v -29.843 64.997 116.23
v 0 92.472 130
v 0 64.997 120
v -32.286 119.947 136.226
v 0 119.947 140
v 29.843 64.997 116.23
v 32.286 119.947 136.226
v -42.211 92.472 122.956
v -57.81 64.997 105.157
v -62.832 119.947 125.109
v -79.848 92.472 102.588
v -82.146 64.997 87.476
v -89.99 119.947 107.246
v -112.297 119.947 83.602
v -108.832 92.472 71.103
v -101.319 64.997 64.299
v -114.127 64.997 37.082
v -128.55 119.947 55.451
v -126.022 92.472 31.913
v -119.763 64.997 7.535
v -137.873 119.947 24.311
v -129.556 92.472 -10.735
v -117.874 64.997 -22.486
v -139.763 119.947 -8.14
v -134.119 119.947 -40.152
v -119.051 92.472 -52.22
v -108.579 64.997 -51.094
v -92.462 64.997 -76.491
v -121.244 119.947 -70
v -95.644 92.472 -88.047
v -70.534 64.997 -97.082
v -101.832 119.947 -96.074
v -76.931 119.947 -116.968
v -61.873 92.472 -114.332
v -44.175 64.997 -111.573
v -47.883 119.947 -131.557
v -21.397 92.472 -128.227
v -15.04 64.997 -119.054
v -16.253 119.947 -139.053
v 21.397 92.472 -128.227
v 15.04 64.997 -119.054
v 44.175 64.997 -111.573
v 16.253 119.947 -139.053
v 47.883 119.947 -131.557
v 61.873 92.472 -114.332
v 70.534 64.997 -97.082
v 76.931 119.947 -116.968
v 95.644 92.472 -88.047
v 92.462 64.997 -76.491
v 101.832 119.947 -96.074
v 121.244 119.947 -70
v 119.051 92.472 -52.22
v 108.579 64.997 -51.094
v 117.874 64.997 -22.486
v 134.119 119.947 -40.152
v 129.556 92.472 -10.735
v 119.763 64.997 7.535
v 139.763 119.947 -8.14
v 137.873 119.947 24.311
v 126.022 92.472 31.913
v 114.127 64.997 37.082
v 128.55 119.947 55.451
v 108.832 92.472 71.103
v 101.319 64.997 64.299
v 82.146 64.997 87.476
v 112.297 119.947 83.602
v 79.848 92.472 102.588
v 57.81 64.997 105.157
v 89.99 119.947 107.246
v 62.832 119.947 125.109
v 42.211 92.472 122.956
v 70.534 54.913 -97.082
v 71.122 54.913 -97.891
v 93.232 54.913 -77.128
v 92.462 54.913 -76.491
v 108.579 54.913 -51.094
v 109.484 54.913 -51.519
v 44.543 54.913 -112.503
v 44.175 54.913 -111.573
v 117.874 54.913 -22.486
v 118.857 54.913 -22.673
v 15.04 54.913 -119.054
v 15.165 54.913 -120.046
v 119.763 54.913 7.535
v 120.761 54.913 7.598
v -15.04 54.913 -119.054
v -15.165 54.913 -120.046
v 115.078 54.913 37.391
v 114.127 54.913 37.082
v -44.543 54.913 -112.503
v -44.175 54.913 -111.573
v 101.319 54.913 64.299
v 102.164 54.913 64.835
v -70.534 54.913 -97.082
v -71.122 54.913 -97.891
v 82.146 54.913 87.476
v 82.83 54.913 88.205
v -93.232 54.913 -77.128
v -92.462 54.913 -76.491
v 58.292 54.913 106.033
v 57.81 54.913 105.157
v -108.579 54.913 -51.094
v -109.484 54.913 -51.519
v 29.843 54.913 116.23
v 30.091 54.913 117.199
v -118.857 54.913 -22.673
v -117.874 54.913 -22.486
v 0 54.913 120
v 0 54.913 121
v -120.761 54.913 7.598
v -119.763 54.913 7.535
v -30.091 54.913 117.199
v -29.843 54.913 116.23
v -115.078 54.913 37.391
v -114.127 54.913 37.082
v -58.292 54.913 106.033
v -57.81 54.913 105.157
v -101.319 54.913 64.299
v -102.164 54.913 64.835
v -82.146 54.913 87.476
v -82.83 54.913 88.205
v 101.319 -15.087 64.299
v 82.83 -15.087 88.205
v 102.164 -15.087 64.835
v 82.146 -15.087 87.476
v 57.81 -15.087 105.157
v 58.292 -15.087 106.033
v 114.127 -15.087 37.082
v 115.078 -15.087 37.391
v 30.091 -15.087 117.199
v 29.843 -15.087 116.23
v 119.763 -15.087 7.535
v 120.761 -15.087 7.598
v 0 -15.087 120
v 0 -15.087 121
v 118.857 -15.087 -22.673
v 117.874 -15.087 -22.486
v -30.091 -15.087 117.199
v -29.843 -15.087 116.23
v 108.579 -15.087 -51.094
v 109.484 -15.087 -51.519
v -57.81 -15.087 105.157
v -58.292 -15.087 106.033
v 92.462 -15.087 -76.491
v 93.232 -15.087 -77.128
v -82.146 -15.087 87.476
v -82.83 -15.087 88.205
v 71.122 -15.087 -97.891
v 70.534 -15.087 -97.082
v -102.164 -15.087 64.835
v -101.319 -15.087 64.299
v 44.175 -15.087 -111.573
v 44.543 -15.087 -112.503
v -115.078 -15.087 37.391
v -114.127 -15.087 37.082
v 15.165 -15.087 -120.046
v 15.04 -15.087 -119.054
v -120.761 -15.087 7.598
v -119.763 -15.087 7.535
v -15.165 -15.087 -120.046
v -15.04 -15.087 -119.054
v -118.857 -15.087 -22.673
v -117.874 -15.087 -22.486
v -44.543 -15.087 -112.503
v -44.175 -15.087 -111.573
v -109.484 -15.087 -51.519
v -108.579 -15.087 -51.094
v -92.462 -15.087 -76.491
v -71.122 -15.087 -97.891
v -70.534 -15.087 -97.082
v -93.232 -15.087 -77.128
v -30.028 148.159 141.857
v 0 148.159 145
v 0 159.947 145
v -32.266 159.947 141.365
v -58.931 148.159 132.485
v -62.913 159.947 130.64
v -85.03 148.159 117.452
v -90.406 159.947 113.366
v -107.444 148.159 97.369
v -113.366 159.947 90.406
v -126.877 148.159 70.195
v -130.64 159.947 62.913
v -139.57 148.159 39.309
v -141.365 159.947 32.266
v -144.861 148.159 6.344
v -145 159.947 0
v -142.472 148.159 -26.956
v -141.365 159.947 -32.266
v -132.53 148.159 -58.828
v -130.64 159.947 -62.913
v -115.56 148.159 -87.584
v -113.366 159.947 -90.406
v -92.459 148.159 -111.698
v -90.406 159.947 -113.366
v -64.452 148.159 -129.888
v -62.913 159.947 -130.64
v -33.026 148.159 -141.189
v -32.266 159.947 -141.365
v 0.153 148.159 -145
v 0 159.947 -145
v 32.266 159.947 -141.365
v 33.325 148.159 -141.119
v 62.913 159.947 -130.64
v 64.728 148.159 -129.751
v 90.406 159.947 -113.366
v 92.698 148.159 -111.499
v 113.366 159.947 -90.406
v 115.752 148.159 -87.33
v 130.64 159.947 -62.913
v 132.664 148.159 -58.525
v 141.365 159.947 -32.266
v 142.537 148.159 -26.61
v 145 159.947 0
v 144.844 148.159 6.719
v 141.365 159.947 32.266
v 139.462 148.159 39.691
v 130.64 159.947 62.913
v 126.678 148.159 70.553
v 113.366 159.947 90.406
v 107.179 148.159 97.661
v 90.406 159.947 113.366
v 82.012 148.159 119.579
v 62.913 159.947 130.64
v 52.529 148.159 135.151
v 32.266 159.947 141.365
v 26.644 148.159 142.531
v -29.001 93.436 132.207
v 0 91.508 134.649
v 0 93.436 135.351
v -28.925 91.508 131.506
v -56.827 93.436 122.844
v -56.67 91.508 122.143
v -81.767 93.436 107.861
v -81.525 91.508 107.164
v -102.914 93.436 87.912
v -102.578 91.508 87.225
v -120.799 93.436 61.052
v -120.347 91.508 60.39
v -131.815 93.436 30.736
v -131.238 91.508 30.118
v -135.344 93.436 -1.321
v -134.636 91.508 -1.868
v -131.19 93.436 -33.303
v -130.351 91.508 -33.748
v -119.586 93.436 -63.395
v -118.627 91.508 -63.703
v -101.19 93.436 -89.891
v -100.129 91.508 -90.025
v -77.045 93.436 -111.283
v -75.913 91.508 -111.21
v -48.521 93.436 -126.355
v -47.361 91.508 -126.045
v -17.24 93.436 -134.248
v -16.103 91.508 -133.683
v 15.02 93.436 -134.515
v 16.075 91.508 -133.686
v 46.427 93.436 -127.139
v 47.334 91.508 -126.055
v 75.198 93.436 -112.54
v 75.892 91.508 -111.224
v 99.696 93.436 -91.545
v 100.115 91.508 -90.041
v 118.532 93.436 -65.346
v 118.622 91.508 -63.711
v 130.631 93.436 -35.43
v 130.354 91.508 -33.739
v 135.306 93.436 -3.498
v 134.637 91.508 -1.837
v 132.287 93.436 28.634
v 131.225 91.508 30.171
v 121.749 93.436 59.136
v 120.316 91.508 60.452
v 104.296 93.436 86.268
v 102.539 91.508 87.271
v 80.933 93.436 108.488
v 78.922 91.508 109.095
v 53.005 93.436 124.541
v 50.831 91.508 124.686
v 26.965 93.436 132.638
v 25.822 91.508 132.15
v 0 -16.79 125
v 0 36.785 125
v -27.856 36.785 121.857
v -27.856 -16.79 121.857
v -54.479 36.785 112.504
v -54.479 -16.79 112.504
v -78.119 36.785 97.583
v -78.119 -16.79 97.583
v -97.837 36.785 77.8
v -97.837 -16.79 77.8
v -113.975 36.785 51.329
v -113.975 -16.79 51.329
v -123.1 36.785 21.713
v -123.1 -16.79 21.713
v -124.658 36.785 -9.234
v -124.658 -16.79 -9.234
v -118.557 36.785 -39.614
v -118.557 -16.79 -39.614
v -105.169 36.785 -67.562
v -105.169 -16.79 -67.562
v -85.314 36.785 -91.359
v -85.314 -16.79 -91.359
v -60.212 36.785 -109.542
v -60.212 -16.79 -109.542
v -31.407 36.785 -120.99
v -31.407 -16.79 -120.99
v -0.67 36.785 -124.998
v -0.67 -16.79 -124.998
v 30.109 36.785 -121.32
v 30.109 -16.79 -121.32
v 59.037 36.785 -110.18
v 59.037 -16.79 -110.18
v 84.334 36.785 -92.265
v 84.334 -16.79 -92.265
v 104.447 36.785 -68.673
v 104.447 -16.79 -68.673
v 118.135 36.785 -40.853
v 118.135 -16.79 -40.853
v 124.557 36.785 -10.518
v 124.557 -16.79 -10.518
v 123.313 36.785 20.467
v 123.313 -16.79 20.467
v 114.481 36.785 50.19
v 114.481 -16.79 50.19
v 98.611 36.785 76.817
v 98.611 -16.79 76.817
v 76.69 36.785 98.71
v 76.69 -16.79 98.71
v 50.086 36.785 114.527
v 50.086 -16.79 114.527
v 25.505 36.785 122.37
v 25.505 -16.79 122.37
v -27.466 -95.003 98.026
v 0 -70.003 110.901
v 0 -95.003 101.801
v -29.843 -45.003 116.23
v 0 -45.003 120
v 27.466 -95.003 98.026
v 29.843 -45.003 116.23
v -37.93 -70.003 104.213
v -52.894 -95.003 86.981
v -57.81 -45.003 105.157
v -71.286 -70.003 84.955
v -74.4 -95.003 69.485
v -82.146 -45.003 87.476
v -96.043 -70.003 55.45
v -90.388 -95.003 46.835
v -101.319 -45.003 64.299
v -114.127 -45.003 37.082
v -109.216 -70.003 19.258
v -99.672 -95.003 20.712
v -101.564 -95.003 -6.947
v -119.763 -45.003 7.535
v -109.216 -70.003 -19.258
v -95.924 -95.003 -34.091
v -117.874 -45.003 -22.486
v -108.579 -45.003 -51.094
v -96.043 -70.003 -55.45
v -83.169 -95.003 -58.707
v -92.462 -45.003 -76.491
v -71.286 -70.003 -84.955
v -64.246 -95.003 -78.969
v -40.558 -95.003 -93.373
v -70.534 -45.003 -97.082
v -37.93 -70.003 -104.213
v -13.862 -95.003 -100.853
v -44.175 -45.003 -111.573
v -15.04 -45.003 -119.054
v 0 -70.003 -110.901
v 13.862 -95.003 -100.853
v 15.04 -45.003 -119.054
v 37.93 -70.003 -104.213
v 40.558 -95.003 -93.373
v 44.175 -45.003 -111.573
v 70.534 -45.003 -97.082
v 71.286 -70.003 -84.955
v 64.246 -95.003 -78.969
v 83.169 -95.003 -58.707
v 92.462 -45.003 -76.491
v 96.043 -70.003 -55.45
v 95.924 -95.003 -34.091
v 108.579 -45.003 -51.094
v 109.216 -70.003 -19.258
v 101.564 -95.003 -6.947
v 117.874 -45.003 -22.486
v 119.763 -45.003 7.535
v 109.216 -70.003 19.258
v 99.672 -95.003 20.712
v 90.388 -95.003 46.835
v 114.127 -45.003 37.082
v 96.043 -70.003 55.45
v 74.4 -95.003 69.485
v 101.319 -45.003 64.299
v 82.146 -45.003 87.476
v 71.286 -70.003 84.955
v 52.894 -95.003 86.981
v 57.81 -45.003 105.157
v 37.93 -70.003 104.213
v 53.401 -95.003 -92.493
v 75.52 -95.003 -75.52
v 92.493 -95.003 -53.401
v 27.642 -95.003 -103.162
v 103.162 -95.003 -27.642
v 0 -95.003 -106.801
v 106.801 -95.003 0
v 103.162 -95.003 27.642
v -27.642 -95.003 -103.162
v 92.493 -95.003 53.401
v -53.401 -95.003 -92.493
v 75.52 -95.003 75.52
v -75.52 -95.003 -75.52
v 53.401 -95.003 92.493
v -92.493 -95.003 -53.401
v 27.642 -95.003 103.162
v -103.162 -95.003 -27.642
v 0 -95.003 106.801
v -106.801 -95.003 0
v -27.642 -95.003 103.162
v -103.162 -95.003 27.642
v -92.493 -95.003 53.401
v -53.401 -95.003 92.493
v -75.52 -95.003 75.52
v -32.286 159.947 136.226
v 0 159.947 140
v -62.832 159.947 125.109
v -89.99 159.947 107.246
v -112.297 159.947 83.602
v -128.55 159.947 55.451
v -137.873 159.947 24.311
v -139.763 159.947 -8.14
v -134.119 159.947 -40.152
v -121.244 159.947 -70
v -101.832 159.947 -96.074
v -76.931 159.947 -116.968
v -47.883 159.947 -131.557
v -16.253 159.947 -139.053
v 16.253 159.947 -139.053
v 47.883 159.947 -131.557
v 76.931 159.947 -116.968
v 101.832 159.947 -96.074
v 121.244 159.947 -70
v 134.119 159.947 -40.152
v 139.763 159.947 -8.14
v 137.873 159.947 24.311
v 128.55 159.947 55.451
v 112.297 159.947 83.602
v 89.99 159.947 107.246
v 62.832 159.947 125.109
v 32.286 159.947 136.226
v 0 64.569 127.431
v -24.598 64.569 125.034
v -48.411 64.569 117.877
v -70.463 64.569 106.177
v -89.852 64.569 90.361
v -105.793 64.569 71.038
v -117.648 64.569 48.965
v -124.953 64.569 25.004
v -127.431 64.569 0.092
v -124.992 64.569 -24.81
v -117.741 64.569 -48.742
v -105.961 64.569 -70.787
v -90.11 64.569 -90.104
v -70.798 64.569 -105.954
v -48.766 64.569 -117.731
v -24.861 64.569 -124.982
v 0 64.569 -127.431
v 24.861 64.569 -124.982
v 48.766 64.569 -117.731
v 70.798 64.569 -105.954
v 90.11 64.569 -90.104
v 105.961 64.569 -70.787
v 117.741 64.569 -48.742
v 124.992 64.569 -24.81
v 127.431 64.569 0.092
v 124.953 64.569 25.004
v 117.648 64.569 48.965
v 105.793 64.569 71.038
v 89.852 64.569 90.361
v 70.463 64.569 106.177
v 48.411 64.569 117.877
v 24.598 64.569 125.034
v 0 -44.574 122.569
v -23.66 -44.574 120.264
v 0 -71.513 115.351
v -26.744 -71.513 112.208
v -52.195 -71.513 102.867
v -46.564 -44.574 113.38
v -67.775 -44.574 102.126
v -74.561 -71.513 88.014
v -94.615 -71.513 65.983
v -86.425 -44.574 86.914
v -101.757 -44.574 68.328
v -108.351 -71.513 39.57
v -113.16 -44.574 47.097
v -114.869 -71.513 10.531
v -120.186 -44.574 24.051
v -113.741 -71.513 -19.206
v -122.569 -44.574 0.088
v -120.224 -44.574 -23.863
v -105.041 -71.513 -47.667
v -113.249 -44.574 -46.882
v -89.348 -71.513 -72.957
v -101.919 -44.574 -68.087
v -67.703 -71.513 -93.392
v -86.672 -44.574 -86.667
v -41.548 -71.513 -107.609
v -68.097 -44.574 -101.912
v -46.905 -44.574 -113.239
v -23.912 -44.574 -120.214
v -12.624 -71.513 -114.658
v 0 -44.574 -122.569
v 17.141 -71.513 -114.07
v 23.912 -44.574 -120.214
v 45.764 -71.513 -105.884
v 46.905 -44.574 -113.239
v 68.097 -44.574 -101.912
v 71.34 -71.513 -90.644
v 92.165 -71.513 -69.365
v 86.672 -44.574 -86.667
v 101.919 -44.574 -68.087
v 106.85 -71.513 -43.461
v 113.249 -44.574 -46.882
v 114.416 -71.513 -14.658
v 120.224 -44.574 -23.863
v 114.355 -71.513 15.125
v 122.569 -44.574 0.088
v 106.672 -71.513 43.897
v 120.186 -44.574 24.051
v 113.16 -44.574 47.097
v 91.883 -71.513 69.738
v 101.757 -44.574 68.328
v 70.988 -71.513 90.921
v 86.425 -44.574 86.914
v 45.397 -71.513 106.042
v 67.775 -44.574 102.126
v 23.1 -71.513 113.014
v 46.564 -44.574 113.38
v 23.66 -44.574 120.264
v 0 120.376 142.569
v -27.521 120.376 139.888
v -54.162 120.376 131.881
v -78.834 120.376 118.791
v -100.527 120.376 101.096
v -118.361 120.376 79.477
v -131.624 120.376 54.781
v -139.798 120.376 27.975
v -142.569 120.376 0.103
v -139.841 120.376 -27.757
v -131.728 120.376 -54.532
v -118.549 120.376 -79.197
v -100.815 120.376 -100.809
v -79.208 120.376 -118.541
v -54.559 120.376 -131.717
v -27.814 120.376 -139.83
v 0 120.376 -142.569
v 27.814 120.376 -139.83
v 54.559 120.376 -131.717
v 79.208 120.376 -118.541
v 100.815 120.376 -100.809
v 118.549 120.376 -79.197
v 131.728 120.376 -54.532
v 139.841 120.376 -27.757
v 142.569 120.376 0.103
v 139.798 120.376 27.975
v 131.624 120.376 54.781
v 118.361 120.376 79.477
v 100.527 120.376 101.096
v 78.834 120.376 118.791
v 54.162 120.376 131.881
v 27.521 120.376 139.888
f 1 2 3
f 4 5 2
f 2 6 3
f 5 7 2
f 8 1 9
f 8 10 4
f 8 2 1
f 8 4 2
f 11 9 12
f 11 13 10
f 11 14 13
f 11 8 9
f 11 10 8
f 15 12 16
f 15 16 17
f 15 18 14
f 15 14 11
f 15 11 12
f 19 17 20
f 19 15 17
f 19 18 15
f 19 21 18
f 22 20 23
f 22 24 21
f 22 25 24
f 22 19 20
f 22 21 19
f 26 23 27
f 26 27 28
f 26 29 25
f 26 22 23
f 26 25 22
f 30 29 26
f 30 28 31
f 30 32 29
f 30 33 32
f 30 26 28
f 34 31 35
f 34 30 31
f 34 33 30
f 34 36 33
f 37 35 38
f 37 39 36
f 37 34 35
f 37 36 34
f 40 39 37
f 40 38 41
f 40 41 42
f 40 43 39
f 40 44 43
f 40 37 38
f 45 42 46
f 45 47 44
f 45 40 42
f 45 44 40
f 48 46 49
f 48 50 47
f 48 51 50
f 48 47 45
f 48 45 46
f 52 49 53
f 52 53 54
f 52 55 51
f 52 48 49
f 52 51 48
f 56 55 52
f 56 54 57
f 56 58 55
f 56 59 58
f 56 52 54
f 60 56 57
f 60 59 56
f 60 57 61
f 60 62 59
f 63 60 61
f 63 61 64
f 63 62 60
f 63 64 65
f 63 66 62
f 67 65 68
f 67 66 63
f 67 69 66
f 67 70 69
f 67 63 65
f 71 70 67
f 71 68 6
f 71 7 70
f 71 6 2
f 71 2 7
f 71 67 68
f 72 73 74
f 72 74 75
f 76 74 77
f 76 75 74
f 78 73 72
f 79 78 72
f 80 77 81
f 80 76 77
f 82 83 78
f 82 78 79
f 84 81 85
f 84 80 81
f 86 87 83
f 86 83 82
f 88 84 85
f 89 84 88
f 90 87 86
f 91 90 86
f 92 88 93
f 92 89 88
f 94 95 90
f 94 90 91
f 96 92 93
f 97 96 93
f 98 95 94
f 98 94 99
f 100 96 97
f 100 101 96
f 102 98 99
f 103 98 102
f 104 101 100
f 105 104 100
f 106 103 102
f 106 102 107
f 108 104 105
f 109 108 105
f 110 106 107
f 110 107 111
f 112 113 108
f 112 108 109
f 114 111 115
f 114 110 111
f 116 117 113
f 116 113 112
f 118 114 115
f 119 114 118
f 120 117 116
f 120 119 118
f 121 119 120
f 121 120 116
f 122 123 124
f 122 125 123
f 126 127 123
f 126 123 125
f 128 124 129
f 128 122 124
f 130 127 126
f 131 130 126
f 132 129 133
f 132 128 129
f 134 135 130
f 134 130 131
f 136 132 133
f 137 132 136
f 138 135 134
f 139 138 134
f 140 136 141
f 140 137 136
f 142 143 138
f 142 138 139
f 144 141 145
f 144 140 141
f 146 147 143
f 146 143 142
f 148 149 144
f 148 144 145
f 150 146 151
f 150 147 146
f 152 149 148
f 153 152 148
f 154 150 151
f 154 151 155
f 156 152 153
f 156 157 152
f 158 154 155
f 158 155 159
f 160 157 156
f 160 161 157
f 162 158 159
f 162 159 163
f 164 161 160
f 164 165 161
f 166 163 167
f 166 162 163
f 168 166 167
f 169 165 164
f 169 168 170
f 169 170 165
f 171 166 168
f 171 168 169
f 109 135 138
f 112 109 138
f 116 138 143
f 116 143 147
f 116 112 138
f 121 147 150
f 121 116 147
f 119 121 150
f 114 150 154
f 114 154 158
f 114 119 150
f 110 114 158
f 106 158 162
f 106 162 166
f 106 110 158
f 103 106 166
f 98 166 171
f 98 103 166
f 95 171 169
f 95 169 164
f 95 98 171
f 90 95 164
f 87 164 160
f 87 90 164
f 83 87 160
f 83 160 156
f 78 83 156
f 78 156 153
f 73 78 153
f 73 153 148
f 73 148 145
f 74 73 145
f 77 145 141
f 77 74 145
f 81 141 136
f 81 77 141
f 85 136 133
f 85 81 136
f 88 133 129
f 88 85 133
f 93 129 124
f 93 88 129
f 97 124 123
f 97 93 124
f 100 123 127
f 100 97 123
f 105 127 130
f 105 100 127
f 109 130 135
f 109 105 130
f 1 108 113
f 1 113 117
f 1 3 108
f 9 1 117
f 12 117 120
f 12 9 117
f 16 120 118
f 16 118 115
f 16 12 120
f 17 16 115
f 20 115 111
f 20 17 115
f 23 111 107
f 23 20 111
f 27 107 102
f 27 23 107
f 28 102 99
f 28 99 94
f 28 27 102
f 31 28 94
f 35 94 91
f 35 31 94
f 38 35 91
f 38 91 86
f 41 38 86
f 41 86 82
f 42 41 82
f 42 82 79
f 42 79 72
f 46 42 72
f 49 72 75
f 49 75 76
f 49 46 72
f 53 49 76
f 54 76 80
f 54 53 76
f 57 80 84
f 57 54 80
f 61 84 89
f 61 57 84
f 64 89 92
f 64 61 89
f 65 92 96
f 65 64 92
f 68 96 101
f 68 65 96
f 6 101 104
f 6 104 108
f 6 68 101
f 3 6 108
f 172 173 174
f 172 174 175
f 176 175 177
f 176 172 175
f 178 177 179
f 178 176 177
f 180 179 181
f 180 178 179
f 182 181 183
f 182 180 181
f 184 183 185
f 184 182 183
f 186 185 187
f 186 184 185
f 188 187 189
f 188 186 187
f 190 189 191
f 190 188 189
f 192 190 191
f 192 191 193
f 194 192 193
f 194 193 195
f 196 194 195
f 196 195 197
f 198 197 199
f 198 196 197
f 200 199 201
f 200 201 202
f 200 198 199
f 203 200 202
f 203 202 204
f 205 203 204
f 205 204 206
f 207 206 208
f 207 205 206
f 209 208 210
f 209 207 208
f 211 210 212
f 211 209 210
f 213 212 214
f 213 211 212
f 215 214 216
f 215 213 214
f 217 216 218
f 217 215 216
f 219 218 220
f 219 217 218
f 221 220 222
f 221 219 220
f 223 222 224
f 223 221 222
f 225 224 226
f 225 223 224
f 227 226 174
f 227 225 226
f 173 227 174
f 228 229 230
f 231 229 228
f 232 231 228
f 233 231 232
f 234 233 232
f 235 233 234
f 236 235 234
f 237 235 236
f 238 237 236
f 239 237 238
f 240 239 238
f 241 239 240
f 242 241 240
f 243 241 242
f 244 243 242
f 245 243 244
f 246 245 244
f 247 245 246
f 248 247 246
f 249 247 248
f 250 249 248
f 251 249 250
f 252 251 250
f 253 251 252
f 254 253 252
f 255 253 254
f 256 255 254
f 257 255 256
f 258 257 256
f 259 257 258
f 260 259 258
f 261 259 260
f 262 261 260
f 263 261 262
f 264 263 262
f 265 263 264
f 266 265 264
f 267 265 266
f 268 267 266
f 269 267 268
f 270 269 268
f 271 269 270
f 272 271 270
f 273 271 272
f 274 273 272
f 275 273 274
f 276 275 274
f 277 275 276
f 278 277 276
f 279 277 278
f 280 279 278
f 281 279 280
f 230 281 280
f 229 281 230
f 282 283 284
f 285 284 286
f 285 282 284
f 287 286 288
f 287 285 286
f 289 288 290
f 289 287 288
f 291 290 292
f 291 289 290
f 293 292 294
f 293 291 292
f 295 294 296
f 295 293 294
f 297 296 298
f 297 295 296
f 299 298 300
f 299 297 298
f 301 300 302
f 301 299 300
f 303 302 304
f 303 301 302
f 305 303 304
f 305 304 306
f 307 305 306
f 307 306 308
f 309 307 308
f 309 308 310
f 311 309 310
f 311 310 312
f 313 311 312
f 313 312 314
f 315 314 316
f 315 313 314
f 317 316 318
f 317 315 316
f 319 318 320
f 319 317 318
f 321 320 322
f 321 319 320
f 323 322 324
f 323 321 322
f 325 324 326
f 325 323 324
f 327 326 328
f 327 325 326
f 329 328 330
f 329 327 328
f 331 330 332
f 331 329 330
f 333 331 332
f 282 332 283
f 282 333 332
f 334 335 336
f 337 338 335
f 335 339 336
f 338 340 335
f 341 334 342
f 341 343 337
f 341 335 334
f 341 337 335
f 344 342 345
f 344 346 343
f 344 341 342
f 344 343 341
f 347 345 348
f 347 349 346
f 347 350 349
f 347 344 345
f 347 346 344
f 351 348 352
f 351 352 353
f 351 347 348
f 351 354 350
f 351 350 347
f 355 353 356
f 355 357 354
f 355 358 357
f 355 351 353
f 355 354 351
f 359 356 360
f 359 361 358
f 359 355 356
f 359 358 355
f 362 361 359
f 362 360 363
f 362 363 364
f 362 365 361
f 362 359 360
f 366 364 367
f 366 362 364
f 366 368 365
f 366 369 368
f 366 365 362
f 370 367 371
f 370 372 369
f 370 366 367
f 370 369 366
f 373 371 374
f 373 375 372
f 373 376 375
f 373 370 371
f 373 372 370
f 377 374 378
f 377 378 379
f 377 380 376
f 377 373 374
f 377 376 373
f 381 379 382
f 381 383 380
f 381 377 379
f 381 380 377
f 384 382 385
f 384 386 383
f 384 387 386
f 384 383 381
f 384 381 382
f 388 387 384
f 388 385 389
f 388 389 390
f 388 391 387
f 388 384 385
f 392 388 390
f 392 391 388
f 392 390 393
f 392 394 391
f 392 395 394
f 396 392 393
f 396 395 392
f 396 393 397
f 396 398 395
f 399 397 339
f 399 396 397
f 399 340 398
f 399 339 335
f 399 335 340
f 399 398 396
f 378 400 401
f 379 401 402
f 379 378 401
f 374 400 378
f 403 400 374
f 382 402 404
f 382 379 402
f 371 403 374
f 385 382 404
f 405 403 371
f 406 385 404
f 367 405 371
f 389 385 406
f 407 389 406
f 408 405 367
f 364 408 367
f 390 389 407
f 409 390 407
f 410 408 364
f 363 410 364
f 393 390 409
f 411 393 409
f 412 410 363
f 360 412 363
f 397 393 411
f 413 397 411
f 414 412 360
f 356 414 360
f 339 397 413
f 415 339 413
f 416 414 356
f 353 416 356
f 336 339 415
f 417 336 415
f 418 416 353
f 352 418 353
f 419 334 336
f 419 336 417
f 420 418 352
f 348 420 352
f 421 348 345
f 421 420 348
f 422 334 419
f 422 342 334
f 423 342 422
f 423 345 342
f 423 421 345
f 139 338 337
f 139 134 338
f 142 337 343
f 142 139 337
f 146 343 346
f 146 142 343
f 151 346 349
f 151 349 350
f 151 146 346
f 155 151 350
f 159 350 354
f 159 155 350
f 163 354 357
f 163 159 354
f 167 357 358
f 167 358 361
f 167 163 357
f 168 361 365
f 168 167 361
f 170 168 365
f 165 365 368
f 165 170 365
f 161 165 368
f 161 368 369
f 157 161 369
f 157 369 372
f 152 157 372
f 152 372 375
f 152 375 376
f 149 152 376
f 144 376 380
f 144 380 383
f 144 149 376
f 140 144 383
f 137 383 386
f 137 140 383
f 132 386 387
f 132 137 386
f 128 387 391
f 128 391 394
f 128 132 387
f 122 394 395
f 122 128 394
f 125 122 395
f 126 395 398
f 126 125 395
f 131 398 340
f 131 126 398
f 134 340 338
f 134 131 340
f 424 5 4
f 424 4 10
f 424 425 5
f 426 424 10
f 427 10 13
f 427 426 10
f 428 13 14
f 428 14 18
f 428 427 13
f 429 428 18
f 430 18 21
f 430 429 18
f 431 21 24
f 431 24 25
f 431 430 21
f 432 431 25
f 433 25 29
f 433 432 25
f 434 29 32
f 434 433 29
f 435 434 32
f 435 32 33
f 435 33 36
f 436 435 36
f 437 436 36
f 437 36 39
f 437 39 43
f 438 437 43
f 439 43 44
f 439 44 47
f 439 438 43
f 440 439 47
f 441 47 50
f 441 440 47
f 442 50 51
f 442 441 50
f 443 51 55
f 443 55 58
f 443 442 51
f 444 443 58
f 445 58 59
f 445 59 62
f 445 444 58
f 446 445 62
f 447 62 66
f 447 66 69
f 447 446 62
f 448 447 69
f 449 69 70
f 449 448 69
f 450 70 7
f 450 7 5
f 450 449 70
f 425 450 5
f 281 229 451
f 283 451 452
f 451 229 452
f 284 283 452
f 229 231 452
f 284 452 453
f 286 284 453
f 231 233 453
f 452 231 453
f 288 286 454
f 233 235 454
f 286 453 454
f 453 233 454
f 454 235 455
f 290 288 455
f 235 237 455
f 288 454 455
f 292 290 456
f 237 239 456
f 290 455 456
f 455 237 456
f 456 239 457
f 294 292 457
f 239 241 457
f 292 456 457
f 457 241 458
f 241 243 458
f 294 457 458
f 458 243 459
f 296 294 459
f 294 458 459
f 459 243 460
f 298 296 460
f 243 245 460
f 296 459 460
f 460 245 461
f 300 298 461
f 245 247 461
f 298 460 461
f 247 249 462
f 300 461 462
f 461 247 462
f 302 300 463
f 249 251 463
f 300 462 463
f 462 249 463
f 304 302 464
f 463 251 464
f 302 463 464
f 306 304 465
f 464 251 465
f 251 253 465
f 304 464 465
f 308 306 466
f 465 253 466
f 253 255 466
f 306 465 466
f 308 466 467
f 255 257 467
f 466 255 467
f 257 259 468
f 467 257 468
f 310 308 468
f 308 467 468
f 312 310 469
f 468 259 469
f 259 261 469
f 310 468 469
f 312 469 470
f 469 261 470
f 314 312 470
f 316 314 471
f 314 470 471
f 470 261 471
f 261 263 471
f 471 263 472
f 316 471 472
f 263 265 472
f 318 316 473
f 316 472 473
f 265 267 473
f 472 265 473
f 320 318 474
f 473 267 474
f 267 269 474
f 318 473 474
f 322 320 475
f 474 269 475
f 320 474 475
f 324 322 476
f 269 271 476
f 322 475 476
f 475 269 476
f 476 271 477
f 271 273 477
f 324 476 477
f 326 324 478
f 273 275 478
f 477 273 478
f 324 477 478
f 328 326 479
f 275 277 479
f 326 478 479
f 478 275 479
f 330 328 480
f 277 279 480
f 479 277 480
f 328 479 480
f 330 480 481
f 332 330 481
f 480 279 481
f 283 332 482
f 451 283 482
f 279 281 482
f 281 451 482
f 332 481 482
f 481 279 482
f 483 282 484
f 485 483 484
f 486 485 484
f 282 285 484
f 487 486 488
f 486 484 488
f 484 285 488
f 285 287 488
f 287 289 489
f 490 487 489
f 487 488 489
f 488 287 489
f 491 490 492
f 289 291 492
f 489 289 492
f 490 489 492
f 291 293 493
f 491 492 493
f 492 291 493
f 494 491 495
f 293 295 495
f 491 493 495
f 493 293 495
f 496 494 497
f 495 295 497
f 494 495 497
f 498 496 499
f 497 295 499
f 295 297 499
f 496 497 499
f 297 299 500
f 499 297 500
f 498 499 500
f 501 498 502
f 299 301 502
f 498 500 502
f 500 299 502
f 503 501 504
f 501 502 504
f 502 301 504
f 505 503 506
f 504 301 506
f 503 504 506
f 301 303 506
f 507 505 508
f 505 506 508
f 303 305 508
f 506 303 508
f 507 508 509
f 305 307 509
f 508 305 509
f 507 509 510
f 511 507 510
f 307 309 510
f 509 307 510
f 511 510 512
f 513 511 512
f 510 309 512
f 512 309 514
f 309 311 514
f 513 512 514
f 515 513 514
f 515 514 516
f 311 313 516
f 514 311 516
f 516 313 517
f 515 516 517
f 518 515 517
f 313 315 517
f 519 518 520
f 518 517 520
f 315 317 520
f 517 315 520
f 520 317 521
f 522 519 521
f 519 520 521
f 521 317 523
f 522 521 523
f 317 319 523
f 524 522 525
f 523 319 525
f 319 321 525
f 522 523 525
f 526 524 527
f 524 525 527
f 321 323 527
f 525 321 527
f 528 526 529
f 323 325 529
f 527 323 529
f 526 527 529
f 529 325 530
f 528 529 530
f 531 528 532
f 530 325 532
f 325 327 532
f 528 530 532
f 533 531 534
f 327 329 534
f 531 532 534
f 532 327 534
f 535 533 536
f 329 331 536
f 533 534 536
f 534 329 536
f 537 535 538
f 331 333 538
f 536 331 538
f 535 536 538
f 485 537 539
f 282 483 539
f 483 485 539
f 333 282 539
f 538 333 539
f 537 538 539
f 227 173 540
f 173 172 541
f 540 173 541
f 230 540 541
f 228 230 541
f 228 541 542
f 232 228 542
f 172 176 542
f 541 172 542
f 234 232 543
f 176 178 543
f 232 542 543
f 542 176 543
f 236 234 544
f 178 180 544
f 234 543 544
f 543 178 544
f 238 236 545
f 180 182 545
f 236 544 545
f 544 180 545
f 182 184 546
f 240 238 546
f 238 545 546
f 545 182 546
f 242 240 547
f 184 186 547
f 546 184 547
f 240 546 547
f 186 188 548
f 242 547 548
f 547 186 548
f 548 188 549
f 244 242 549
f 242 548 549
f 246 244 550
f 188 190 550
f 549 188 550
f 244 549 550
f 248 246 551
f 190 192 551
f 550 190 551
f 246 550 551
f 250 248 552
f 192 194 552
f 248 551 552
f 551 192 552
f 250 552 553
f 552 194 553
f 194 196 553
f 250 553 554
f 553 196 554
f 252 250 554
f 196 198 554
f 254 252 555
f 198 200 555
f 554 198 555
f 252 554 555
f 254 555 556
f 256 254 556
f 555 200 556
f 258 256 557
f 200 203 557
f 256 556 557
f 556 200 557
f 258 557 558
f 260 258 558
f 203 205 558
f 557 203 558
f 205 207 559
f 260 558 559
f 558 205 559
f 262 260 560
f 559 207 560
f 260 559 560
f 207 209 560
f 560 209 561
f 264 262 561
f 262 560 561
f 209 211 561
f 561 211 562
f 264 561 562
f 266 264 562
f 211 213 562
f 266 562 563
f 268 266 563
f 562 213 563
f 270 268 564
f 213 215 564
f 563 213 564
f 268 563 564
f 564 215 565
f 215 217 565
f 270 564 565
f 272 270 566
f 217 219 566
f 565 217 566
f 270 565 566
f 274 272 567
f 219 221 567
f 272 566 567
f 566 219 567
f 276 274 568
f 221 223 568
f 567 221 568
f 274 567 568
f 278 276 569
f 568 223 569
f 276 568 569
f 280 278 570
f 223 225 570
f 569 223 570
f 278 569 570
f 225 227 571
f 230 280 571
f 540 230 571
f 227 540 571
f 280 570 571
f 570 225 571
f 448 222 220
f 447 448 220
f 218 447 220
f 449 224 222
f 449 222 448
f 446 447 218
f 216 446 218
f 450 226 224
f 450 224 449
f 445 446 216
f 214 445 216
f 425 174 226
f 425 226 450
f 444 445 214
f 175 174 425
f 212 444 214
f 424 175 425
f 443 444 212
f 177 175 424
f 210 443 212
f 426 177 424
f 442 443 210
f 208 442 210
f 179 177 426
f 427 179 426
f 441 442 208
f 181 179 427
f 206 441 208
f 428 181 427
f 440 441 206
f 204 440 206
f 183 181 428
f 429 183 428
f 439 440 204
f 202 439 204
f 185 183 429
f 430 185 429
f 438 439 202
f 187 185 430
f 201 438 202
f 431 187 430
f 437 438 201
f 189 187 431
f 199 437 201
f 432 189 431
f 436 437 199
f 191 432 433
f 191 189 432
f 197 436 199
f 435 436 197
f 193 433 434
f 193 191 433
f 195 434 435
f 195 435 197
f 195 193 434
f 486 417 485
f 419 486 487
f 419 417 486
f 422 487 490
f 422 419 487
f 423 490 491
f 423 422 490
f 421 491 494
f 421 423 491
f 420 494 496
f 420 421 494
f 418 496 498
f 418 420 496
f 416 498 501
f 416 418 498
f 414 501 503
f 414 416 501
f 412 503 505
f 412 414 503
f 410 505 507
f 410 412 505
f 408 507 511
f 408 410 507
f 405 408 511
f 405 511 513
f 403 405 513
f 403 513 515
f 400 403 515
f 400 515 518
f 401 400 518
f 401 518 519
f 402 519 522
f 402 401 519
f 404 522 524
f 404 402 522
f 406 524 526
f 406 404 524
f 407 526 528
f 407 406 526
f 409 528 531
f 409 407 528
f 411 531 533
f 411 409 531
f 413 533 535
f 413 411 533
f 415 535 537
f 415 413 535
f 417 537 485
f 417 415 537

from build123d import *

# Parameters (mm, degrees)
FILLET1_R = 160


with BuildPart() as part:
    # Sketch1 → Revolve1 (revolve)
    with BuildSketch(Plane(origin=(0, 0, 0), x_dir=(0, 0, -1), z_dir=(1, 0, 0)), mode=Mode.PRIVATE) as revolve1_sk:
        Polygon((140, 159.946981615), (145, 159.946981615), (145, 119.946981615), (125, 64.997433226), (125, -45.002566774), (106.801488287, -95.002566774), (101.801488287, -95.002566774), (120, -45.002566774), (120, -15.087139211), (121, -15.087139211), (121, 54.912860789), (120, 54.912860789), (120, 64.997433226), (140, 119.946981615), align=None)
    revolve(revolve1_sk.sketch.rotate(Axis((0, 159.946981615, 0), (0, -1, 0)), 180), axis=Axis((0, 159.946981615, 0), (0, -1, 0)))

    # Fillet1
    fillet1_edges = [part.edges().sort_by_distance(p)[0] for p in [
        (0, -45.002566774, -125),
        (0, 64.997433226, -125),
        (0, 119.946981615, -145),
    ]]
    fillet(fillet1_edges, radius=FILLET1_R)


solid = part.part
